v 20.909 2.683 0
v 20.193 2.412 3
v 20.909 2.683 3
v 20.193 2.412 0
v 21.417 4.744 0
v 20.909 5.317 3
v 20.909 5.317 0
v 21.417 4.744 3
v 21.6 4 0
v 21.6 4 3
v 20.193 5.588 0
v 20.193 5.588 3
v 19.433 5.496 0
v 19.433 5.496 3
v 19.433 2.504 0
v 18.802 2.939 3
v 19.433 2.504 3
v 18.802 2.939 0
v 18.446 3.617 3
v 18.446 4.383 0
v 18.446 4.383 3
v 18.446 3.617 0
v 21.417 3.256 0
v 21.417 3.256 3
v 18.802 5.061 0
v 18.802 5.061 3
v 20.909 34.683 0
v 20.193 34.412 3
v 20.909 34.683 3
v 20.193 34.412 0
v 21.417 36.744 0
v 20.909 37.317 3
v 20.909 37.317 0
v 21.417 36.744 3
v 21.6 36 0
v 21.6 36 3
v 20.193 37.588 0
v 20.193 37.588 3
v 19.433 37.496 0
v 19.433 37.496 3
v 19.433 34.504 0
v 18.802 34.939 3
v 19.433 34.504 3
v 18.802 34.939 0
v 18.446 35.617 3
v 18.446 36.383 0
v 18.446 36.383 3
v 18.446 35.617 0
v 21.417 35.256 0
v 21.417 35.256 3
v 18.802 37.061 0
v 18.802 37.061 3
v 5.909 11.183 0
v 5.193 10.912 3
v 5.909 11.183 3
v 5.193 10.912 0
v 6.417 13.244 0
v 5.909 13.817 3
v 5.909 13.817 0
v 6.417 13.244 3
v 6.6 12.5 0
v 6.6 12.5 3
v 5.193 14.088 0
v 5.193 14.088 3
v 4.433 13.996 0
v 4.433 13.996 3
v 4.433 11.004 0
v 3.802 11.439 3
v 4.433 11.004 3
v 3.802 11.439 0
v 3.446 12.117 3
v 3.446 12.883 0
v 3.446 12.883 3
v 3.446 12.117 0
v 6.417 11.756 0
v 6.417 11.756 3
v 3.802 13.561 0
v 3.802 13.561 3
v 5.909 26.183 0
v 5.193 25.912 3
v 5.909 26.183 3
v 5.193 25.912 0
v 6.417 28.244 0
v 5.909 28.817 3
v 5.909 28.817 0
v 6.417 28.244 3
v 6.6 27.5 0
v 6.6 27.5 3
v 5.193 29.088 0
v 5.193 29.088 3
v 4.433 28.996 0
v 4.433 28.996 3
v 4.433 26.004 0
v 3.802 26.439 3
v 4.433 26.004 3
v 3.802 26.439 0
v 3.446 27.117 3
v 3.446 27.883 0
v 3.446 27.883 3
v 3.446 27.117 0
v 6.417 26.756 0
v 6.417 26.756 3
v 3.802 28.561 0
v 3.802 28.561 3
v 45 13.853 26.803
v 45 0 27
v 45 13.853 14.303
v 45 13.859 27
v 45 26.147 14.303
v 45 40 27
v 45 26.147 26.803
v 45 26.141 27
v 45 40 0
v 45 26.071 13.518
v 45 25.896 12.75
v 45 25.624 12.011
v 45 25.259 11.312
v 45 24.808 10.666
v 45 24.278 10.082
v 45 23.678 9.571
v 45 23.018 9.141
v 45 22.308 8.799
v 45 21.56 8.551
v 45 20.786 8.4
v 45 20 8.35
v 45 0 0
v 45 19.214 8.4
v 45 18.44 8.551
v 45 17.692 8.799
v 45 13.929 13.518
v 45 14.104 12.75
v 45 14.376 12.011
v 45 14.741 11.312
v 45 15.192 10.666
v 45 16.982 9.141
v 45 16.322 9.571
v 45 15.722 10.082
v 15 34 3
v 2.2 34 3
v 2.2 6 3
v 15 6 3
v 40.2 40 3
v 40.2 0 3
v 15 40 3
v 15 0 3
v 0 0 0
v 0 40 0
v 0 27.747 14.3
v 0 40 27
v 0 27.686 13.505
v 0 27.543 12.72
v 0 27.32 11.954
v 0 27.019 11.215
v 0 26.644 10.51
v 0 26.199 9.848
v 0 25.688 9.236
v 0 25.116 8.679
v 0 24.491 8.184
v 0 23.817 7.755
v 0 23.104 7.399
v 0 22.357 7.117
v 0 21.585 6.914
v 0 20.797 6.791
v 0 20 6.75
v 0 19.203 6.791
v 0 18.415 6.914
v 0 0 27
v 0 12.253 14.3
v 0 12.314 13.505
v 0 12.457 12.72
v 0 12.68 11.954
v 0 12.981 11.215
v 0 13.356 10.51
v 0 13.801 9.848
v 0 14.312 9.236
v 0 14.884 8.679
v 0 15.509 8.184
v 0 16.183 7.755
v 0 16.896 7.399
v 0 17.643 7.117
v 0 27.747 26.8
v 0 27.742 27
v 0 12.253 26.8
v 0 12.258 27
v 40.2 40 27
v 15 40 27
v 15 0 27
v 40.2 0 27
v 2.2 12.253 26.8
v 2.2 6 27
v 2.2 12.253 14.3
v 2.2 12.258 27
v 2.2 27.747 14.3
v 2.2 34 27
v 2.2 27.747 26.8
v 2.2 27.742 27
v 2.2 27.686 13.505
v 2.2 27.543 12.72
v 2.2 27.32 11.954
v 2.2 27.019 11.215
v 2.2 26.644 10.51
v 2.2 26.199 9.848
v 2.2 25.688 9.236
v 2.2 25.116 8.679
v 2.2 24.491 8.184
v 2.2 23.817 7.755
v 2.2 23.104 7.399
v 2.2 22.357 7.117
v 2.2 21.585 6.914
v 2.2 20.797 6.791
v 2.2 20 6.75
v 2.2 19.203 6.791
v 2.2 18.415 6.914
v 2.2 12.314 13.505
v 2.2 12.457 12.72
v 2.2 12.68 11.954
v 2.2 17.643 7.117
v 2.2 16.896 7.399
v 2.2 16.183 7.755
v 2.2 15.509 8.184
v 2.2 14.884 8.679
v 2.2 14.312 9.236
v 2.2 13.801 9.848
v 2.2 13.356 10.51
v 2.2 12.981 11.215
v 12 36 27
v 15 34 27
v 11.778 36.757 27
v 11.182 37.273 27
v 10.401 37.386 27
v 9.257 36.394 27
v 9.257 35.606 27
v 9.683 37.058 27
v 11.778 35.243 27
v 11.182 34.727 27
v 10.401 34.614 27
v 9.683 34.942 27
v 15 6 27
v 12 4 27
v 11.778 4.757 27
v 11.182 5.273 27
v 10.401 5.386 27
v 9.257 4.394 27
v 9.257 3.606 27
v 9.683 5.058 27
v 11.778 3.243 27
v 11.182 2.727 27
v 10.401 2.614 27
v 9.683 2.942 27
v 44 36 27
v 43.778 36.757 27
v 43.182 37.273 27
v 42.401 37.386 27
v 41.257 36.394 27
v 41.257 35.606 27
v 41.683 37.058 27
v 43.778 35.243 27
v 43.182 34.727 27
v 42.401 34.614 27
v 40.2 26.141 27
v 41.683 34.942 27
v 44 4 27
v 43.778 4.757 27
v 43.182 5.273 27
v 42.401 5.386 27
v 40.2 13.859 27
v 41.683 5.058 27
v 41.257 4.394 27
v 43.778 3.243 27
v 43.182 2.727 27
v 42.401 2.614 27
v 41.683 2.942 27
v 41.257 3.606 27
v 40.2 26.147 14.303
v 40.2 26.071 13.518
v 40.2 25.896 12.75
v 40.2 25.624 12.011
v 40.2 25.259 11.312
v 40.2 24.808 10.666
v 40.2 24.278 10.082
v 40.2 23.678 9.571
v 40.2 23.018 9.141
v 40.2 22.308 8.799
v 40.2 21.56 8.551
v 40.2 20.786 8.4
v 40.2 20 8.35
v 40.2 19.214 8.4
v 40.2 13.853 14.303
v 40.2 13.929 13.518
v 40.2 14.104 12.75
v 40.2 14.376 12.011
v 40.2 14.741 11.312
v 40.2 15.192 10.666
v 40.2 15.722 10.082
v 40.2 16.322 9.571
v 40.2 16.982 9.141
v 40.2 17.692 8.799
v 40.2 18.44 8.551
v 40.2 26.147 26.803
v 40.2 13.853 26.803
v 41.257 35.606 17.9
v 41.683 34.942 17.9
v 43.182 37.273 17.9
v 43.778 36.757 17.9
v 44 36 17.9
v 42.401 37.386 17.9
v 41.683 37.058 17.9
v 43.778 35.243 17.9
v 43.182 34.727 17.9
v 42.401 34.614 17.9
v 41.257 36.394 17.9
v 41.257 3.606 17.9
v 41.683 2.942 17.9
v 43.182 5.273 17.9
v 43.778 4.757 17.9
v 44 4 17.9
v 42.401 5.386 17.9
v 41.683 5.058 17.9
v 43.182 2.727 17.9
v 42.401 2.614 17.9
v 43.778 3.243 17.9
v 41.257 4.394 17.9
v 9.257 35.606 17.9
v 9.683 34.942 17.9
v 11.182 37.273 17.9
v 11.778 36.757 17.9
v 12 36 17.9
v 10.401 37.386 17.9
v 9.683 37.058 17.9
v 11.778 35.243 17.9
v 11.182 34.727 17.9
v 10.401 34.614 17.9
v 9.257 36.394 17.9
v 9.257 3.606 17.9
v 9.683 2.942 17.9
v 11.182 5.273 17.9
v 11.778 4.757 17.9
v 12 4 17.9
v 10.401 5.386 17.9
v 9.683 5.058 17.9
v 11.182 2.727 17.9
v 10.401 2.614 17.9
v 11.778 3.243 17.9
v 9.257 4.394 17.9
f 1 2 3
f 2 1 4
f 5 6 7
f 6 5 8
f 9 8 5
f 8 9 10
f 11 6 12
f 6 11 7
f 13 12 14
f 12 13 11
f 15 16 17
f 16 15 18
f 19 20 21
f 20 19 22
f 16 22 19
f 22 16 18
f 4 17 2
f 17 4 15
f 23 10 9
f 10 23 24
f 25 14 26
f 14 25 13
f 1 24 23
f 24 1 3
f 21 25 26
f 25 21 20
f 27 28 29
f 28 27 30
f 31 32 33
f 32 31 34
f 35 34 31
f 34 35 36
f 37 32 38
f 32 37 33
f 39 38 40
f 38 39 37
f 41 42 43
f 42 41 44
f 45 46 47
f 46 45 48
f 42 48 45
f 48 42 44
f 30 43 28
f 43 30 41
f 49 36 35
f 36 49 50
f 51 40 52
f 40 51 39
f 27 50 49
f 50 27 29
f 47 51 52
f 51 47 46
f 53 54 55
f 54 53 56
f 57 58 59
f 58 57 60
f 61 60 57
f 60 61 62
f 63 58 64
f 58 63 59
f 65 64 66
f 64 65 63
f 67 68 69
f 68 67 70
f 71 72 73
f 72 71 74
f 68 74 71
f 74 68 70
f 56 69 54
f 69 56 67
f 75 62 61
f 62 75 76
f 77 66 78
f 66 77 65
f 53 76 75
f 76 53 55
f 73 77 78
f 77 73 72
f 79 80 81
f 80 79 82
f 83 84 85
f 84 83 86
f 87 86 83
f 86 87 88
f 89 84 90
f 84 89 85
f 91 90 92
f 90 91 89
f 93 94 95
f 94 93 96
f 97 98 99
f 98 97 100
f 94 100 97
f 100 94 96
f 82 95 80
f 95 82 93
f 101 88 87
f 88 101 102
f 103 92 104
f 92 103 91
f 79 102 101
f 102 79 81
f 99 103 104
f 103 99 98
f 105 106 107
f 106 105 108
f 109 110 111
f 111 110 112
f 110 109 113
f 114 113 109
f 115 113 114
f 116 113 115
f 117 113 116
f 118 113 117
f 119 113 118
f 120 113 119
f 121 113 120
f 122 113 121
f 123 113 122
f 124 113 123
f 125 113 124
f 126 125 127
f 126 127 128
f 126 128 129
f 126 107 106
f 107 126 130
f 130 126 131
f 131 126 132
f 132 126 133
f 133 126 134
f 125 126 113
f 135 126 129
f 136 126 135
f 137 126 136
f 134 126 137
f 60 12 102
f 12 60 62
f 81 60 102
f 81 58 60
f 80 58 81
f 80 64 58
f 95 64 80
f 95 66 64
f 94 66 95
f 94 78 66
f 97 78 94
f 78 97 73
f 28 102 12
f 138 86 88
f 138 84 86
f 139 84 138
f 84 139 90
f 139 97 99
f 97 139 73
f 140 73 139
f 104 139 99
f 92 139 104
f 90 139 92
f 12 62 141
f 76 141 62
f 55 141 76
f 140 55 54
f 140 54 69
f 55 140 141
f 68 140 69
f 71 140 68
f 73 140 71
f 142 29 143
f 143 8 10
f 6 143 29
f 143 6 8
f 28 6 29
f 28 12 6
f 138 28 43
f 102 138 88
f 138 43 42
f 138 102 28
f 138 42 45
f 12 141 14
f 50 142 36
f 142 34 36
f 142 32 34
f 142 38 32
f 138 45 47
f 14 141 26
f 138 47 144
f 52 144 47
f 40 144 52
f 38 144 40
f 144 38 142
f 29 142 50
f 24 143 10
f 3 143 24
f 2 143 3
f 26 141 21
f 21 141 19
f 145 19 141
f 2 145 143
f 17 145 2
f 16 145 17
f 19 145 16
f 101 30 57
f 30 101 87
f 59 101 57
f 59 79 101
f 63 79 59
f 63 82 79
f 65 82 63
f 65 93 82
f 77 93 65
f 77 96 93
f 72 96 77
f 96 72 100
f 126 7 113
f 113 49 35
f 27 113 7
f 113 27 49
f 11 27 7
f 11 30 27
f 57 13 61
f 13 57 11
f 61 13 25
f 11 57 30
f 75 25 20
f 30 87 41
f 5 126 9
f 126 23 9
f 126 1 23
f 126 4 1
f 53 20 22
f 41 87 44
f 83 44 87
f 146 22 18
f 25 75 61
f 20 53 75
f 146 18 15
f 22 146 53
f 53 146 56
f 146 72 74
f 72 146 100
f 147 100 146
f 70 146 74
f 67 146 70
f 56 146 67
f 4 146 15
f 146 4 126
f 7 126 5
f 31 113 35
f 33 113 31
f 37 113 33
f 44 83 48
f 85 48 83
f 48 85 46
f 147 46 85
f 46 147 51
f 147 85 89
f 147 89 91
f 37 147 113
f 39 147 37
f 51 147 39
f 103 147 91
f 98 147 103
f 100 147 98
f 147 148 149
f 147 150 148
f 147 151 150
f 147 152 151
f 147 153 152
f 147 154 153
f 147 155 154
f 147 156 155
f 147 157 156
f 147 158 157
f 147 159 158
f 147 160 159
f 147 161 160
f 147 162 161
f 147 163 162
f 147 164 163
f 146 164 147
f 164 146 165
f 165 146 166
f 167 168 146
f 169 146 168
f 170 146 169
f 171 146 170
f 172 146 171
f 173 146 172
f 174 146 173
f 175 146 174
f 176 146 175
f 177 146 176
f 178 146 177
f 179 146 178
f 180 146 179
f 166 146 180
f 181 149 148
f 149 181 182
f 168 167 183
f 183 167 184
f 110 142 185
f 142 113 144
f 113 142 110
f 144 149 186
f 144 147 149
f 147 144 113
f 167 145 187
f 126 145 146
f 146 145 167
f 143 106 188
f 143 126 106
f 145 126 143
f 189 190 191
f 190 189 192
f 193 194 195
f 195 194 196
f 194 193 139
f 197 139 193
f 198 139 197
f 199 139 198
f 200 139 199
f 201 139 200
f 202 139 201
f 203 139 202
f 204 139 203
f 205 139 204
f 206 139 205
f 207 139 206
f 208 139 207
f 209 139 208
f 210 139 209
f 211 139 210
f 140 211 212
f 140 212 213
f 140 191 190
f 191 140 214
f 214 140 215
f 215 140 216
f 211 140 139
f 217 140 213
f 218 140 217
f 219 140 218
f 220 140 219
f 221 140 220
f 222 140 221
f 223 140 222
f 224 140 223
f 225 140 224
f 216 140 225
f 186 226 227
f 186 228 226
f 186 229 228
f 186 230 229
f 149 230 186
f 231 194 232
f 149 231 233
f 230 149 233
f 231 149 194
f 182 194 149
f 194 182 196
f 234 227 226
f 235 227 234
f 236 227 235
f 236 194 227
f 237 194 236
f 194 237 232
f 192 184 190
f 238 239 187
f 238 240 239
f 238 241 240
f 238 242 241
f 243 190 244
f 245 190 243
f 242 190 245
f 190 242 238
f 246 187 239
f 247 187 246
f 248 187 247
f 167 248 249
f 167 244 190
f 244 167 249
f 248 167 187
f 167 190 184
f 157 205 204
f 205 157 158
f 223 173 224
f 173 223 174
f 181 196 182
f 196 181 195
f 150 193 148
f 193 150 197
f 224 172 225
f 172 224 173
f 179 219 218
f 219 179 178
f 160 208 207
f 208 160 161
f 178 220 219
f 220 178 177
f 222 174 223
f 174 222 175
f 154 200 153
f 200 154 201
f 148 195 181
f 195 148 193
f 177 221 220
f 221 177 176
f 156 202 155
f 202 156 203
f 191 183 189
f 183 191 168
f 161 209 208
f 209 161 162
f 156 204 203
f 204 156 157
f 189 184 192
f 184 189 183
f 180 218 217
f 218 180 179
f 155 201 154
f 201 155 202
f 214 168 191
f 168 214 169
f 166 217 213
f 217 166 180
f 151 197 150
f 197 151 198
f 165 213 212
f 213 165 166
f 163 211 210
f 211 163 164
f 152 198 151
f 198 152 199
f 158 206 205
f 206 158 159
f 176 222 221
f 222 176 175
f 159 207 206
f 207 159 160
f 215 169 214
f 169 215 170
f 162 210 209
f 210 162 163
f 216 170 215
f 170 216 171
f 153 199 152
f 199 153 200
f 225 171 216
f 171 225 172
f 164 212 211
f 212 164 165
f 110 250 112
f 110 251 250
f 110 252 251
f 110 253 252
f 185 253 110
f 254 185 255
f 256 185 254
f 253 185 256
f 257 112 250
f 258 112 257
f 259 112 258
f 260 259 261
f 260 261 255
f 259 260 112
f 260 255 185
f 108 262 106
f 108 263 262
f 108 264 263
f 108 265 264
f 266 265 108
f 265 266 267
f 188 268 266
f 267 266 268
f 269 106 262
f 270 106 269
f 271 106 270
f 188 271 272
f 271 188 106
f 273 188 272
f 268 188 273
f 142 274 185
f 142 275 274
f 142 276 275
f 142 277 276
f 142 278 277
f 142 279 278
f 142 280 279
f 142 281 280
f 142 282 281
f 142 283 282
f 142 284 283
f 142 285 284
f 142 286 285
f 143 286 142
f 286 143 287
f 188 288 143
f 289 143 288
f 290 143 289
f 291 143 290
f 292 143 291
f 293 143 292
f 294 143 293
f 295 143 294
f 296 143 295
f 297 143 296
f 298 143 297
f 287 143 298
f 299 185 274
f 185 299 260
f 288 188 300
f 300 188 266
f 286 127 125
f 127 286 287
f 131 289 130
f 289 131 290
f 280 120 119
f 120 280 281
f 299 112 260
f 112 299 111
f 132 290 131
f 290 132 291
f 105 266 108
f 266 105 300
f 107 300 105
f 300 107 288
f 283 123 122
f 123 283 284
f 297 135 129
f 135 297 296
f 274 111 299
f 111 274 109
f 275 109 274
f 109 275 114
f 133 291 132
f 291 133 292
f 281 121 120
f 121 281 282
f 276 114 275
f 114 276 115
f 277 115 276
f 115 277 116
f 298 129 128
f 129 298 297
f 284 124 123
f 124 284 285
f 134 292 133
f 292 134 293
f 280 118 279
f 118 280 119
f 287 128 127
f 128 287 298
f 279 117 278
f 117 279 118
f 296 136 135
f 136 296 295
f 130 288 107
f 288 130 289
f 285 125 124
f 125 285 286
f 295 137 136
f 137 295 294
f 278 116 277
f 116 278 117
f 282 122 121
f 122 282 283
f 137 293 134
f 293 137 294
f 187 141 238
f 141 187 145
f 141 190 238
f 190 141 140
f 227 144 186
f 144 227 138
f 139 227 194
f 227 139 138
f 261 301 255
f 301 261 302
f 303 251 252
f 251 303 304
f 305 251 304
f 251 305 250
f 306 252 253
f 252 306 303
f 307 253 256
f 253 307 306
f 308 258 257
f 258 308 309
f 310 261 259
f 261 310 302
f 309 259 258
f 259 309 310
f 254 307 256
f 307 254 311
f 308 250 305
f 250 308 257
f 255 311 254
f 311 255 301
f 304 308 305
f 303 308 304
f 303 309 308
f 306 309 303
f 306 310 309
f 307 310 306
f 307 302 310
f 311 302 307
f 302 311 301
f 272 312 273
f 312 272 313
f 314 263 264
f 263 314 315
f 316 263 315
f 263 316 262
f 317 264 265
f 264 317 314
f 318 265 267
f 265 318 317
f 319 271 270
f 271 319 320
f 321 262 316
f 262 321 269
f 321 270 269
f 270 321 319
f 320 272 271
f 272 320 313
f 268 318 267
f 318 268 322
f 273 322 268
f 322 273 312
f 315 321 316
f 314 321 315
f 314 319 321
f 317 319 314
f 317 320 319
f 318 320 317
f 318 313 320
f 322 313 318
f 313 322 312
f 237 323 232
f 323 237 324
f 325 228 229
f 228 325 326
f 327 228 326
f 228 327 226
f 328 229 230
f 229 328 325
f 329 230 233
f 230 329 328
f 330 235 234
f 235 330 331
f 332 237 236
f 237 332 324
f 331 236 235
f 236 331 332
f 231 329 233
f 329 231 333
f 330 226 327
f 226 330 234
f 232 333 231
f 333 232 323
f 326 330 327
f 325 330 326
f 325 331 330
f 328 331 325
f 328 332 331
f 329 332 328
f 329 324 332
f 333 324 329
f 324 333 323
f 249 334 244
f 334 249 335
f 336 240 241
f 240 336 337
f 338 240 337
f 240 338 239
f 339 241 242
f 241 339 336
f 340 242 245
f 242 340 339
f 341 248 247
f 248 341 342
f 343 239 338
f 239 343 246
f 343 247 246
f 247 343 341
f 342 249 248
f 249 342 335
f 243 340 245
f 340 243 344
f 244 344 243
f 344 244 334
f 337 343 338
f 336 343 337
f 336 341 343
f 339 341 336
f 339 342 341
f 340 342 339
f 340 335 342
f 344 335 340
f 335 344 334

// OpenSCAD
$fs=0.8; // def 1, 0.2 is high res
$fa=4;//def 12, 3 is very nice
%translate([0,0,-0.5])cube([200,200,1],center=true); //build platform

gap = 38;
screw_hole = 1.6;

bottomU = 2.2;
bottomU_slot = 15.5;

topU = 4.8;
topU_slot = 12.3;

length_y = 40;
width_x = gap+topU+bottomU;
height_z = 27;

fan_hole_centres = 32;

module fan_screw_holes(centres = 32, holeR = 1.6, depth = 4) {
	for(xp = [0:1]) { //4 x screw holes
		for(yp = [0:1]) { 
			translate([(centres/2) - (xp*centres), (centres/2) - (yp*centres),-.1]) cylinder(depth,holeR,holeR);
		}
	}
}

module bottom_slot() {
	hull() {
		translate([-7.5,length_y/2,(25/2)+2]) rotate([0,90,0]) cylinder(r=bottomU_slot/2, 10);
		translate([-7.5,length_y/2,(25)+2]) rotate([0,90,0]) cylinder(r=bottomU_slot/2, 10);
	}
}

module top_slot() {
	hull() {
		translate([width_x-7.5,length_y/2,(25/2)+2]) rotate([0,90,0]) cylinder(r=topU_slot/2, 10);
		translate([width_x-7.5,length_y/2,(25)+2]) rotate([0,90,0]) cylinder(r=topU_slot/2, 10);
	}    
}

module my_carriage() {
    //heatsink screw holes
    translate([20,4,-1]) cylinder(r=screw_hole,h=6);
    translate([20,36,-1]) cylinder(r=screw_hole,h=6);
}

module rrp_carriage() {
    //heatsink screw holes
    translate([5,12.5,-1]) cylinder(r=screw_hole,h=6);
    translate([5,27.5,-1]) cylinder(r=screw_hole,h=6);
}

difference() {
    union() {
        difference() {
            cube([width_x,length_y,3]); //Base/back
            my_carriage();
            rrp_carriage();

        }
        
        difference() {
            cube([bottomU,length_y,height_z]); //bottom U
            bottom_slot();
        }

        difference() {
            translate([width_x-topU,0,0]) cube([topU,length_y,height_z]); //top U
            top_slot();
        }

        cube([15,6,height_z]);
        translate([0,length_y-6,0]) cube([15,6,height_z]);
    }
    
    translate([width_x-(fan_hole_centres/2)-(topU/2),length_y/2,height_z-9]) fan_screw_holes(fan_hole_centres, 1.4, 10);
}
